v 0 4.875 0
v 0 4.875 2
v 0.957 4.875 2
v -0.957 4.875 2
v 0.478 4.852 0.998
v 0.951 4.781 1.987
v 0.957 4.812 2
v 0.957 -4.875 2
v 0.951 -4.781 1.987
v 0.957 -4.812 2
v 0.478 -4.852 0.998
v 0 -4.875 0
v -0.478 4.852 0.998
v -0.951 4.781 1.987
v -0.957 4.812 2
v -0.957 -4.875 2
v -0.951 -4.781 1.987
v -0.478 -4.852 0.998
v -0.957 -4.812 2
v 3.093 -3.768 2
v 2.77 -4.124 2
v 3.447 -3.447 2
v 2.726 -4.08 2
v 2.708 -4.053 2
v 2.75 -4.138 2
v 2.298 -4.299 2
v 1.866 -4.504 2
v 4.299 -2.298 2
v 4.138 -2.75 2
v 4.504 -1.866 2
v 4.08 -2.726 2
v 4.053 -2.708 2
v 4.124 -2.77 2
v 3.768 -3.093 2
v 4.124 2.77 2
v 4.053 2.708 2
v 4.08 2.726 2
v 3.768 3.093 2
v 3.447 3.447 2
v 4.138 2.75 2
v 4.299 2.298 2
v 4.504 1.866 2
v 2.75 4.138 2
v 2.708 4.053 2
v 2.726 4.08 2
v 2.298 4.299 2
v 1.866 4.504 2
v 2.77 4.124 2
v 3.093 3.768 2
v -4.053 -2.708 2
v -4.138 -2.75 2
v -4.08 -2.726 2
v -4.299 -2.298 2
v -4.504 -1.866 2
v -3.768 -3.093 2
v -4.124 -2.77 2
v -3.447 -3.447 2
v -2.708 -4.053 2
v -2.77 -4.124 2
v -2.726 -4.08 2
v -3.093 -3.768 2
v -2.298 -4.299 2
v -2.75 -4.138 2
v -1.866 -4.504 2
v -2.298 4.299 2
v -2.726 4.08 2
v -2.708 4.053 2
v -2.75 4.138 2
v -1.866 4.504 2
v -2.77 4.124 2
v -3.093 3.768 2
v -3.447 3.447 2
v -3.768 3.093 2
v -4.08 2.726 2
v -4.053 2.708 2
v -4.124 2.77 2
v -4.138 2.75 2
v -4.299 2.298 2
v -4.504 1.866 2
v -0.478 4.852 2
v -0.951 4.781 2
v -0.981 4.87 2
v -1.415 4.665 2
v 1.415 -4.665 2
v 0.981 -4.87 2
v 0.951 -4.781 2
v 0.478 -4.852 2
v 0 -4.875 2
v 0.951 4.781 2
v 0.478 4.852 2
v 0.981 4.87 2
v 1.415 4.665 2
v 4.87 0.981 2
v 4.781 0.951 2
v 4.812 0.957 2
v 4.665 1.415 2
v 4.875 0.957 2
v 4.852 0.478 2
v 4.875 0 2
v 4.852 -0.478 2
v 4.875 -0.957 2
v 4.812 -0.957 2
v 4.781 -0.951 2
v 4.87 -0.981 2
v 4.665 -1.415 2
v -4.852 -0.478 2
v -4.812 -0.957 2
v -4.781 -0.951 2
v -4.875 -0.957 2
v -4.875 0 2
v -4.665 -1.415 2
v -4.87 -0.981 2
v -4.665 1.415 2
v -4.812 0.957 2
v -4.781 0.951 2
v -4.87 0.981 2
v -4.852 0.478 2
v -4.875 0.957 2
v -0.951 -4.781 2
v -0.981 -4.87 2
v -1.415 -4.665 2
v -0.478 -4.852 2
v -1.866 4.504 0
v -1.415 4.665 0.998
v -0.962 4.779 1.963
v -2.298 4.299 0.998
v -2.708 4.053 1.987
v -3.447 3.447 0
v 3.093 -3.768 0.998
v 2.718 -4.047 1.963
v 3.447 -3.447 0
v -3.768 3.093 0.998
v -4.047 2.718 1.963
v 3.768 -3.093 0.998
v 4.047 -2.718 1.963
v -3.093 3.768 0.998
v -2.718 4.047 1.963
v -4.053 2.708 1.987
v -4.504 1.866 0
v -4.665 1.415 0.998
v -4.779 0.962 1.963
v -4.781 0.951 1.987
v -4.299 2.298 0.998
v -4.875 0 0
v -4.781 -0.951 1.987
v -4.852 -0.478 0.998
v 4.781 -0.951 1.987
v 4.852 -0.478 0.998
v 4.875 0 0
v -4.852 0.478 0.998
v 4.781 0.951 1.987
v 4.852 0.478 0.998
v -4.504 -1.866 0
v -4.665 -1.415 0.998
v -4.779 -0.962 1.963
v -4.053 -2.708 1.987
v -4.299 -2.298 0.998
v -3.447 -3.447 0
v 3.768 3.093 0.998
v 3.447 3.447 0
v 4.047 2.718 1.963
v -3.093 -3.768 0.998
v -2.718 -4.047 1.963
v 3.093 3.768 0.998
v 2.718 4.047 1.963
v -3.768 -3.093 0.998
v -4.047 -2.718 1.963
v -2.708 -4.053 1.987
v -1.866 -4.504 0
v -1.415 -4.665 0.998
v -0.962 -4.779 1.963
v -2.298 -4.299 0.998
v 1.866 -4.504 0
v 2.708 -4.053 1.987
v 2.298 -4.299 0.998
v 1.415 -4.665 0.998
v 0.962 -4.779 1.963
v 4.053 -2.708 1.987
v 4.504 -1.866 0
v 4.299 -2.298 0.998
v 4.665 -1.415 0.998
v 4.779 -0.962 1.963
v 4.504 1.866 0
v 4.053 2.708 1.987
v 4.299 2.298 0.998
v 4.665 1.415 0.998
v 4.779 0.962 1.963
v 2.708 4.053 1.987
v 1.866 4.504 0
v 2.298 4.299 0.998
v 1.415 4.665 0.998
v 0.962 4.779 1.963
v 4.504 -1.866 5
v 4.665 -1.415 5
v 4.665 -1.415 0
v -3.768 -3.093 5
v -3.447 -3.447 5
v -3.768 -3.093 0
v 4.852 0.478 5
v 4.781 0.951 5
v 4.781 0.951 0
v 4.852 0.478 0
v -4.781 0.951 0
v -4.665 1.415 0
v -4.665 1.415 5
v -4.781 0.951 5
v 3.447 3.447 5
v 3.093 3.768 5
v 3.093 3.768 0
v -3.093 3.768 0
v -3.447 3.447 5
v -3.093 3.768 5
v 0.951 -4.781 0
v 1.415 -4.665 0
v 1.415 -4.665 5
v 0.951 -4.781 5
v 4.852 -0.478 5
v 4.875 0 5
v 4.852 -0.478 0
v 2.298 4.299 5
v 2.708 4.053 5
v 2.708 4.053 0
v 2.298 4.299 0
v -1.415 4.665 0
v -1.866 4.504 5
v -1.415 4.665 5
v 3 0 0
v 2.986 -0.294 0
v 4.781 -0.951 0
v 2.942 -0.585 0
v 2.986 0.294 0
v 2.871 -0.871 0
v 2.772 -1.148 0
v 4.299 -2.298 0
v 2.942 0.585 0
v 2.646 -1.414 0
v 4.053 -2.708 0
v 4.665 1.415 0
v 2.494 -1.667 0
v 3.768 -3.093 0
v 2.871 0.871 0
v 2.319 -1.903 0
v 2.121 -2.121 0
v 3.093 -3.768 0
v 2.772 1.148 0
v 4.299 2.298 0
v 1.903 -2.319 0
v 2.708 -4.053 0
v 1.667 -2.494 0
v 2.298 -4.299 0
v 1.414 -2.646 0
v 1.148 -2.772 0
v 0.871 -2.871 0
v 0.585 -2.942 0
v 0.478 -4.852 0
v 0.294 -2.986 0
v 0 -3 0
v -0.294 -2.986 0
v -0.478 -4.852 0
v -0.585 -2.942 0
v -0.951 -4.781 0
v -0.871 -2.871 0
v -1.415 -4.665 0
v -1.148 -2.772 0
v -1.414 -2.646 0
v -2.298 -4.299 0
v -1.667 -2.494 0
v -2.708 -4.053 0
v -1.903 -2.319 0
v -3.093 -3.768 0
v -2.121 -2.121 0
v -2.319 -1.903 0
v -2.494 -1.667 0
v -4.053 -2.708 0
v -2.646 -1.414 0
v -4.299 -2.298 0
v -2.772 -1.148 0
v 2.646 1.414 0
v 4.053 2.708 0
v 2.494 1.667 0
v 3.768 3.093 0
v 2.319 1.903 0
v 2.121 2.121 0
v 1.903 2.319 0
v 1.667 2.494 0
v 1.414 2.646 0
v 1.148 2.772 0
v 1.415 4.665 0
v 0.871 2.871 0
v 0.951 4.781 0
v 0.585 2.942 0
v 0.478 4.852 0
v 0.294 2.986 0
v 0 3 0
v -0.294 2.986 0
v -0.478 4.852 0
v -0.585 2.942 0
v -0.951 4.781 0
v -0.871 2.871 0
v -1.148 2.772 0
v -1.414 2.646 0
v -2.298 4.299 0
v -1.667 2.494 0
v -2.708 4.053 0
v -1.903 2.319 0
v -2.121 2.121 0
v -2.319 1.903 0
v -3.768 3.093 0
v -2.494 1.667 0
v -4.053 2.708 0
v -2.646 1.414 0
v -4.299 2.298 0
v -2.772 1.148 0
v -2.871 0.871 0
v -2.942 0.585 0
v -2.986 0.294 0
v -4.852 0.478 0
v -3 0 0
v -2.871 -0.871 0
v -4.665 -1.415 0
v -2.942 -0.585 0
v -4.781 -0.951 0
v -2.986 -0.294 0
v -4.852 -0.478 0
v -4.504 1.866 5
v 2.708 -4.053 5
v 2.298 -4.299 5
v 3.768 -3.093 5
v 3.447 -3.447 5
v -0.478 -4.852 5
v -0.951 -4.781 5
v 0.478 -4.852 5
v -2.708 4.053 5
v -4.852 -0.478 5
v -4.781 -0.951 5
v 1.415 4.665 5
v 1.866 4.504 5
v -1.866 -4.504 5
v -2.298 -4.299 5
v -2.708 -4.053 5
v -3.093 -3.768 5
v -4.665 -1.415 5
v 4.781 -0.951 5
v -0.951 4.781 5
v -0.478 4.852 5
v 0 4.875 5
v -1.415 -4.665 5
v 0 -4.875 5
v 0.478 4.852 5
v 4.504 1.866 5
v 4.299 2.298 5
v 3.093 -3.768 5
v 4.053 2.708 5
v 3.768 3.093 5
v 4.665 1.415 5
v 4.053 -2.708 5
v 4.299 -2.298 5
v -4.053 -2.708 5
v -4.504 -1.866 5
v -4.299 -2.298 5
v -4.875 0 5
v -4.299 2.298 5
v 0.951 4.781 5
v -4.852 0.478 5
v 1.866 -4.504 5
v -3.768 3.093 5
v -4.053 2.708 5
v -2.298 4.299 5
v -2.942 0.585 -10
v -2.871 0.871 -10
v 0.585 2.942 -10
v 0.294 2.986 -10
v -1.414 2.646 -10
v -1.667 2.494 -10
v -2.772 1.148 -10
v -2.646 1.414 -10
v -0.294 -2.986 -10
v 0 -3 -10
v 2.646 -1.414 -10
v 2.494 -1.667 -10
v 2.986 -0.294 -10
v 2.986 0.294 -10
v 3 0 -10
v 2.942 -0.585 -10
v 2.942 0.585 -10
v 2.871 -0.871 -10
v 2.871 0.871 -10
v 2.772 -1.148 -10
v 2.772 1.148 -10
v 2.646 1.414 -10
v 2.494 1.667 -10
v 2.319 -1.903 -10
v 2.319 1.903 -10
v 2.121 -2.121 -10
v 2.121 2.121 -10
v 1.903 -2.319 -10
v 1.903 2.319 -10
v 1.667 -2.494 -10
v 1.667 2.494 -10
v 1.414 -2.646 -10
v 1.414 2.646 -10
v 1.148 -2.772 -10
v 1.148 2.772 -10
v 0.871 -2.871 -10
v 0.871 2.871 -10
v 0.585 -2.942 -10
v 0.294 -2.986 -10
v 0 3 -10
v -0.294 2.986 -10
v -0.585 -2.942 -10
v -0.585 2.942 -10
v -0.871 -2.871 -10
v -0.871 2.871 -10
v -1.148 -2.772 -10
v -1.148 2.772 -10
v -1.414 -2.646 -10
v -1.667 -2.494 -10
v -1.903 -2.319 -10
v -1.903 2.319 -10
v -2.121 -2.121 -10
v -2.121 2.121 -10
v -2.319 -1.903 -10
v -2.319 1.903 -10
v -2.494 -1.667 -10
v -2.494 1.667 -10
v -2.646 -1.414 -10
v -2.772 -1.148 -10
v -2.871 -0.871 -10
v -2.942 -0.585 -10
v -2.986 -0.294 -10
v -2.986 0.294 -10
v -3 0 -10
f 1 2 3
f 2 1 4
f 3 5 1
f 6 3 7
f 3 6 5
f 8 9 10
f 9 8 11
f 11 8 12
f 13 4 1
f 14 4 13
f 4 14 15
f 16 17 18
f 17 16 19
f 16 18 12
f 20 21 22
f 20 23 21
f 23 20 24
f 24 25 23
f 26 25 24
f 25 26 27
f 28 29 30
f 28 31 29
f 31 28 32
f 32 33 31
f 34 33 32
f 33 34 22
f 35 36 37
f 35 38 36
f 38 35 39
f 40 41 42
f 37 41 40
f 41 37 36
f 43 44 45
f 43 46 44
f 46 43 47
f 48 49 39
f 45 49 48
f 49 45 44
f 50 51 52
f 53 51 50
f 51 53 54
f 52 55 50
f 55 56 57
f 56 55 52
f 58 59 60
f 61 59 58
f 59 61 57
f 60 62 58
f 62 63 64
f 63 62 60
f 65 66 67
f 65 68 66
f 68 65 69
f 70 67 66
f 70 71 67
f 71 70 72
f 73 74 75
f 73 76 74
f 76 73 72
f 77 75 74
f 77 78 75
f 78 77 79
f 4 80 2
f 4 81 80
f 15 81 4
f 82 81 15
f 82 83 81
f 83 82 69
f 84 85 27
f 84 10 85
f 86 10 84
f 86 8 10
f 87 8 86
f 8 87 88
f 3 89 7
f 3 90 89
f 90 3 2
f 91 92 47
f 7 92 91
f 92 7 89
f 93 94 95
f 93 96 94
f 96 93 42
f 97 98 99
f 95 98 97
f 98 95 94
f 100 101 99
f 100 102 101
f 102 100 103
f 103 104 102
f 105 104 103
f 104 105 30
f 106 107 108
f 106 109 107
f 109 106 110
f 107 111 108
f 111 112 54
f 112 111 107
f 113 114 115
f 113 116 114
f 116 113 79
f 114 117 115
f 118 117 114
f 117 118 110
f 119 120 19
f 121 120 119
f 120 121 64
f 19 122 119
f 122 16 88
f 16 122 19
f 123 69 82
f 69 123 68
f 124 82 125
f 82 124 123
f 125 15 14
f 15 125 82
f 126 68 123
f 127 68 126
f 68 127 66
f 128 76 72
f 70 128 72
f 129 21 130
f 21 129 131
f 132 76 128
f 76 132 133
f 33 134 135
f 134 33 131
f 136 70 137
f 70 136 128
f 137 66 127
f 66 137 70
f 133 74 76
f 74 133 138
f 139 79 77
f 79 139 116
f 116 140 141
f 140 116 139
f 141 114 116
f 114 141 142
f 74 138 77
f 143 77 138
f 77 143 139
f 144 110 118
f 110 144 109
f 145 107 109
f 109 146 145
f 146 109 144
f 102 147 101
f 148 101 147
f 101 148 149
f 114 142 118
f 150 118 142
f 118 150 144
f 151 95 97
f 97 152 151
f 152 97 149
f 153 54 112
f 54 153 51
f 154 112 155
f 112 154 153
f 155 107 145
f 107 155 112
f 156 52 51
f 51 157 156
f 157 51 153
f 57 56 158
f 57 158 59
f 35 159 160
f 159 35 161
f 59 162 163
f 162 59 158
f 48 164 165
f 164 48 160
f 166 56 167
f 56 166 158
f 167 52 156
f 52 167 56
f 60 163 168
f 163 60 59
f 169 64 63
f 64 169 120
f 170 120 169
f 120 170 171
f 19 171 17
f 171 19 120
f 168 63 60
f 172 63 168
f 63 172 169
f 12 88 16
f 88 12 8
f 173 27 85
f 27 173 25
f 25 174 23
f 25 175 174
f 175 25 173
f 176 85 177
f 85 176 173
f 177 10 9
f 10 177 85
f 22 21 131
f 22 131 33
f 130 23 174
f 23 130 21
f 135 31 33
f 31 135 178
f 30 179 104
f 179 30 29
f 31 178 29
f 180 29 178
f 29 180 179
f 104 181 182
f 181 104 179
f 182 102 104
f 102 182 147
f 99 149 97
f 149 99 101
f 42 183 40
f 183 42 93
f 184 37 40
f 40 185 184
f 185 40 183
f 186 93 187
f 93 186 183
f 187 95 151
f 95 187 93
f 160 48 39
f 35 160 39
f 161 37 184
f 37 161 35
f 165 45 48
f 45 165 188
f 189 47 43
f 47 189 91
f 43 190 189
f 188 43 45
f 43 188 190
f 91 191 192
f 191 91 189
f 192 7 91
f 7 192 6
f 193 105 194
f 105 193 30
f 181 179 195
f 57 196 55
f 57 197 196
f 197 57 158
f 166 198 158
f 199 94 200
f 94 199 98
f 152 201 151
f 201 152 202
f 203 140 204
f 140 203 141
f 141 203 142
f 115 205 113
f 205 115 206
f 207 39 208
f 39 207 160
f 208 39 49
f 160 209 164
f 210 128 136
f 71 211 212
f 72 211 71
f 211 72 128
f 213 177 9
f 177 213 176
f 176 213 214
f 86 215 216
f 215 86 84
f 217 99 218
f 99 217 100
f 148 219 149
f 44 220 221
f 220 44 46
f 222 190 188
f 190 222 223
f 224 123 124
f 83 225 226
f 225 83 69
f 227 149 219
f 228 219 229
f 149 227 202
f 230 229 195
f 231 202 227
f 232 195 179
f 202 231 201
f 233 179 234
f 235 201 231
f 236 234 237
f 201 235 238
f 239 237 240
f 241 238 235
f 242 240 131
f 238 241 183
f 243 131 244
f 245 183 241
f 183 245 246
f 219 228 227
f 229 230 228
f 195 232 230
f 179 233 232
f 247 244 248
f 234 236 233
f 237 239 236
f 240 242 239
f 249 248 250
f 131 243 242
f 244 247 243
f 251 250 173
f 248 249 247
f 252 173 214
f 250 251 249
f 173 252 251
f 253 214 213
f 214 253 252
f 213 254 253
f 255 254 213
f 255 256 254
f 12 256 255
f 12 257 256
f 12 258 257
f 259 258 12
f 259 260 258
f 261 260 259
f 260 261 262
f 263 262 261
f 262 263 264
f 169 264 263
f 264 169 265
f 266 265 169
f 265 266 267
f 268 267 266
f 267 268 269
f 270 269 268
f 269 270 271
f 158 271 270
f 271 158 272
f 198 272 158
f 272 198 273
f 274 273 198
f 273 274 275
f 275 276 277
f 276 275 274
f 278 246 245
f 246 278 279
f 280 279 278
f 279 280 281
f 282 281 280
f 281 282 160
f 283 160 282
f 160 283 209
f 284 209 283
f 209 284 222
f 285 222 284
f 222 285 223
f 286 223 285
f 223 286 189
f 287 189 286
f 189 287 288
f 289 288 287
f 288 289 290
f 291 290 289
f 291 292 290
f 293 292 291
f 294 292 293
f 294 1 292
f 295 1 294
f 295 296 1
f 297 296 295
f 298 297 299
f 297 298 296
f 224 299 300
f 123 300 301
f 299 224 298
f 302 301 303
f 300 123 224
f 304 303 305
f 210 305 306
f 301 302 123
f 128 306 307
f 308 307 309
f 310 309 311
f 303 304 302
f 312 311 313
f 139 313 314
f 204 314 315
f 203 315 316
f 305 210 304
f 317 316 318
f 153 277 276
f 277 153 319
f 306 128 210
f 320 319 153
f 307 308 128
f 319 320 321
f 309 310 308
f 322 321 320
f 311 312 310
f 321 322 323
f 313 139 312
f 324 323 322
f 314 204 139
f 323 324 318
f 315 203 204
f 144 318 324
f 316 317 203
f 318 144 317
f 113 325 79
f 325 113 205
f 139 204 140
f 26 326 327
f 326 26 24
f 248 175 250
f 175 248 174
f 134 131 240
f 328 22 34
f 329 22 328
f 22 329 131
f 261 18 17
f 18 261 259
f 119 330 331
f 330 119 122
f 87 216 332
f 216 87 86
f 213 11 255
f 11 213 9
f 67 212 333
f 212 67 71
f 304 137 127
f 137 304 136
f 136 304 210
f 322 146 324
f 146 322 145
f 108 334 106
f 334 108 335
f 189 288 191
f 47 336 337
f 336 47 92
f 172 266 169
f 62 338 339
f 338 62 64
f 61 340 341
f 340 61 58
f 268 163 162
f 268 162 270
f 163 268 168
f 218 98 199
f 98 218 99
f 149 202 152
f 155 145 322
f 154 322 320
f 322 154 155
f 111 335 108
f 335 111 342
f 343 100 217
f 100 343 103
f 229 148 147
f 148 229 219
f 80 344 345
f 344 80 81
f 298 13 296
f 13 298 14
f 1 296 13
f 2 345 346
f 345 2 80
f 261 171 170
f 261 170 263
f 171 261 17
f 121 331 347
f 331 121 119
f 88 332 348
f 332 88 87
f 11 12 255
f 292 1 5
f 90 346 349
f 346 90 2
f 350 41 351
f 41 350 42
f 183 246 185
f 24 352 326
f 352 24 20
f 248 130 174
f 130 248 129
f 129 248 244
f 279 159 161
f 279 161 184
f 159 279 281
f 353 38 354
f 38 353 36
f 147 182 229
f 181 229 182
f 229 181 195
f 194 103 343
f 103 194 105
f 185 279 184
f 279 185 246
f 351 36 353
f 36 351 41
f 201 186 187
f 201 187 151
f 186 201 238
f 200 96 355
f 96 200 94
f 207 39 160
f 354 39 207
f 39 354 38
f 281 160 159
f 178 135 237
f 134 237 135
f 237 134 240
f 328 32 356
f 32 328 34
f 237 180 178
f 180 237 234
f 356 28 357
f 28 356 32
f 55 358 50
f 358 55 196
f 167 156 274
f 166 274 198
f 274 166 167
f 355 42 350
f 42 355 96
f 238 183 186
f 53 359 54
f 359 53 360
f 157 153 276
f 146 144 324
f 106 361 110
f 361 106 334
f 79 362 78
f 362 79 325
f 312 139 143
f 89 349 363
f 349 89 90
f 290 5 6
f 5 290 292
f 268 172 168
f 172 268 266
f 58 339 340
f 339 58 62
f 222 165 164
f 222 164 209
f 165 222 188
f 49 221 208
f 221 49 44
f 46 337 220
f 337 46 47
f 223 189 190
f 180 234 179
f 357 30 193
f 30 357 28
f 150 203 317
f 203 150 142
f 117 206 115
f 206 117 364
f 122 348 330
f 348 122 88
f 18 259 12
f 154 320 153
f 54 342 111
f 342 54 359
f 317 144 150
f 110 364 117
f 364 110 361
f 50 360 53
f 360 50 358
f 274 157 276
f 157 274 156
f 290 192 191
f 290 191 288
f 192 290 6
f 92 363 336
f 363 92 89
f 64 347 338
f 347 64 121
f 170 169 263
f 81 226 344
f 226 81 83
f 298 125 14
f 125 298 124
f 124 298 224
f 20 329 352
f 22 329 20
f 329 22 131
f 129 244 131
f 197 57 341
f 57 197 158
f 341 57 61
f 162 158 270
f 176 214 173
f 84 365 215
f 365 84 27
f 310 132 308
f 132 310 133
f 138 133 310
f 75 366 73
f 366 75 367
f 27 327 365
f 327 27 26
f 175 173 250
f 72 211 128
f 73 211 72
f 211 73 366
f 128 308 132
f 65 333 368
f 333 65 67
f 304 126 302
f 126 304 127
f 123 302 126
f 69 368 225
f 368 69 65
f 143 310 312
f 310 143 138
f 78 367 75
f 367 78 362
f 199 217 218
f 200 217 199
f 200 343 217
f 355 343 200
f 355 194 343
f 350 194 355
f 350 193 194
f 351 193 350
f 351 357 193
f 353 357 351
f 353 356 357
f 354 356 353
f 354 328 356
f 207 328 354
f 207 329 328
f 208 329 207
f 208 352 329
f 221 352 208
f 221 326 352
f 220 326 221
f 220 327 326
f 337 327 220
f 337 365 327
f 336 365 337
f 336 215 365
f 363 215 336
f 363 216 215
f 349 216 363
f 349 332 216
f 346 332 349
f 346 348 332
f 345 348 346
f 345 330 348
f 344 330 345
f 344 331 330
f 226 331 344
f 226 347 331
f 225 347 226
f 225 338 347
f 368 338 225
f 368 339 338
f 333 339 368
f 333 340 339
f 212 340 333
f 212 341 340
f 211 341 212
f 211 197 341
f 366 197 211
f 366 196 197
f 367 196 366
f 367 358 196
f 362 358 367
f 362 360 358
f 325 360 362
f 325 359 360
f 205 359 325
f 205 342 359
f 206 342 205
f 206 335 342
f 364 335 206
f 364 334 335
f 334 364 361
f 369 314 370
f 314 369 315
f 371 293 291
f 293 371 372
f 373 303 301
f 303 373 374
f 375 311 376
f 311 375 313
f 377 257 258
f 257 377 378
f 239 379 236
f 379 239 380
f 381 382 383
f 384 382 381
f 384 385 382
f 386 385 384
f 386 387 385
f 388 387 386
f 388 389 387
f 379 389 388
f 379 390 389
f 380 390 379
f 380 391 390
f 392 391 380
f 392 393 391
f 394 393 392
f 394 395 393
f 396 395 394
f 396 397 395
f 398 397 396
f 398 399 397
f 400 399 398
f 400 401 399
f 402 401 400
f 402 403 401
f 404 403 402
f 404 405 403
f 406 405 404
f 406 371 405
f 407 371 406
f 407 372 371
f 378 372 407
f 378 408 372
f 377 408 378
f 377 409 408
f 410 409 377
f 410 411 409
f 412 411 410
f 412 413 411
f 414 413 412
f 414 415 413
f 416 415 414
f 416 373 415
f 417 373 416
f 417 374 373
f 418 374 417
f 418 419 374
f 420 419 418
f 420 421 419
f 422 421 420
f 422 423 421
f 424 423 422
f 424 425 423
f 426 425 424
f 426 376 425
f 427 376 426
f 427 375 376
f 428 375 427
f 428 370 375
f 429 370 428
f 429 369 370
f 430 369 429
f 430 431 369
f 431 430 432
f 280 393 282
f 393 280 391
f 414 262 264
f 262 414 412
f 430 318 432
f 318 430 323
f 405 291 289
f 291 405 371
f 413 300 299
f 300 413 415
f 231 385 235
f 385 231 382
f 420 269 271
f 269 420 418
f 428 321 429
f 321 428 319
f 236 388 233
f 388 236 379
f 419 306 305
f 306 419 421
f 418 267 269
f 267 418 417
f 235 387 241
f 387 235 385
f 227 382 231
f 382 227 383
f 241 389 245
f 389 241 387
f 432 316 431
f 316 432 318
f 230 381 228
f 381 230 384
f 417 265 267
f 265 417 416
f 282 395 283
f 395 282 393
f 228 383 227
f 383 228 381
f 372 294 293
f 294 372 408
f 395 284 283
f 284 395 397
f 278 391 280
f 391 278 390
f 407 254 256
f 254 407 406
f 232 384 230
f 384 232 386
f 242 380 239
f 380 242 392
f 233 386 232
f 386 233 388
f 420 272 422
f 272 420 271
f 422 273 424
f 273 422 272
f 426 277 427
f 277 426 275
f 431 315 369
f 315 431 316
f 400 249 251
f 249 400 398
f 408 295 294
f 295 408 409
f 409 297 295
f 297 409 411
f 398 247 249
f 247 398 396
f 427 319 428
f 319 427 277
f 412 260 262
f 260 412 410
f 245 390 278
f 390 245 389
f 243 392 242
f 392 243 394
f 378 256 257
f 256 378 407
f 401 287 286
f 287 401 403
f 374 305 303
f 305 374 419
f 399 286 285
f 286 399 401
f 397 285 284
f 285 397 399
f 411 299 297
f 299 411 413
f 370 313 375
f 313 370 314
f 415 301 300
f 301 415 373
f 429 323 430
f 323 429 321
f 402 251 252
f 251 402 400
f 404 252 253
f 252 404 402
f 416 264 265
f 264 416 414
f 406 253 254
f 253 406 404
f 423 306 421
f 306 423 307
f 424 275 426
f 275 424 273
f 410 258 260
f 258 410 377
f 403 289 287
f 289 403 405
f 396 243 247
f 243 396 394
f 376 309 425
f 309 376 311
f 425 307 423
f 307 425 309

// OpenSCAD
module timing_pulley(teeth=16, pitch_diameter=9.75, belt_width=5, hub_diameter=6, hub_height=10) {
    tooth_height = 2;
    tooth_width = pitch_diameter * PI / teeth;
    pulley_radius = pitch_diameter / 2;
    
    module tooth() {
        translate([0, pulley_radius, 0])
        rotate([90, 0, 0])
        linear_extrude(height=belt_width)
        polygon(points=[[0, 0], [tooth_width / 2, tooth_height], [-tooth_width / 2, tooth_height]]);
    }
    
    union() {
        // Create the main pulley body
        cylinder(h=belt_width, r=pulley_radius, $fn=64);
        
        // Add teeth around the pulley
        for (i = [0:teeth-1]) {
            rotate([0, 0, i * 360 / teeth])
            tooth();
        }
        
        // Add the hub
        translate([0, 0, -hub_height])
        cylinder(h=hub_height + belt_width, r=hub_diameter / 2, $fn=64);
    }
}

timing_pulley();
